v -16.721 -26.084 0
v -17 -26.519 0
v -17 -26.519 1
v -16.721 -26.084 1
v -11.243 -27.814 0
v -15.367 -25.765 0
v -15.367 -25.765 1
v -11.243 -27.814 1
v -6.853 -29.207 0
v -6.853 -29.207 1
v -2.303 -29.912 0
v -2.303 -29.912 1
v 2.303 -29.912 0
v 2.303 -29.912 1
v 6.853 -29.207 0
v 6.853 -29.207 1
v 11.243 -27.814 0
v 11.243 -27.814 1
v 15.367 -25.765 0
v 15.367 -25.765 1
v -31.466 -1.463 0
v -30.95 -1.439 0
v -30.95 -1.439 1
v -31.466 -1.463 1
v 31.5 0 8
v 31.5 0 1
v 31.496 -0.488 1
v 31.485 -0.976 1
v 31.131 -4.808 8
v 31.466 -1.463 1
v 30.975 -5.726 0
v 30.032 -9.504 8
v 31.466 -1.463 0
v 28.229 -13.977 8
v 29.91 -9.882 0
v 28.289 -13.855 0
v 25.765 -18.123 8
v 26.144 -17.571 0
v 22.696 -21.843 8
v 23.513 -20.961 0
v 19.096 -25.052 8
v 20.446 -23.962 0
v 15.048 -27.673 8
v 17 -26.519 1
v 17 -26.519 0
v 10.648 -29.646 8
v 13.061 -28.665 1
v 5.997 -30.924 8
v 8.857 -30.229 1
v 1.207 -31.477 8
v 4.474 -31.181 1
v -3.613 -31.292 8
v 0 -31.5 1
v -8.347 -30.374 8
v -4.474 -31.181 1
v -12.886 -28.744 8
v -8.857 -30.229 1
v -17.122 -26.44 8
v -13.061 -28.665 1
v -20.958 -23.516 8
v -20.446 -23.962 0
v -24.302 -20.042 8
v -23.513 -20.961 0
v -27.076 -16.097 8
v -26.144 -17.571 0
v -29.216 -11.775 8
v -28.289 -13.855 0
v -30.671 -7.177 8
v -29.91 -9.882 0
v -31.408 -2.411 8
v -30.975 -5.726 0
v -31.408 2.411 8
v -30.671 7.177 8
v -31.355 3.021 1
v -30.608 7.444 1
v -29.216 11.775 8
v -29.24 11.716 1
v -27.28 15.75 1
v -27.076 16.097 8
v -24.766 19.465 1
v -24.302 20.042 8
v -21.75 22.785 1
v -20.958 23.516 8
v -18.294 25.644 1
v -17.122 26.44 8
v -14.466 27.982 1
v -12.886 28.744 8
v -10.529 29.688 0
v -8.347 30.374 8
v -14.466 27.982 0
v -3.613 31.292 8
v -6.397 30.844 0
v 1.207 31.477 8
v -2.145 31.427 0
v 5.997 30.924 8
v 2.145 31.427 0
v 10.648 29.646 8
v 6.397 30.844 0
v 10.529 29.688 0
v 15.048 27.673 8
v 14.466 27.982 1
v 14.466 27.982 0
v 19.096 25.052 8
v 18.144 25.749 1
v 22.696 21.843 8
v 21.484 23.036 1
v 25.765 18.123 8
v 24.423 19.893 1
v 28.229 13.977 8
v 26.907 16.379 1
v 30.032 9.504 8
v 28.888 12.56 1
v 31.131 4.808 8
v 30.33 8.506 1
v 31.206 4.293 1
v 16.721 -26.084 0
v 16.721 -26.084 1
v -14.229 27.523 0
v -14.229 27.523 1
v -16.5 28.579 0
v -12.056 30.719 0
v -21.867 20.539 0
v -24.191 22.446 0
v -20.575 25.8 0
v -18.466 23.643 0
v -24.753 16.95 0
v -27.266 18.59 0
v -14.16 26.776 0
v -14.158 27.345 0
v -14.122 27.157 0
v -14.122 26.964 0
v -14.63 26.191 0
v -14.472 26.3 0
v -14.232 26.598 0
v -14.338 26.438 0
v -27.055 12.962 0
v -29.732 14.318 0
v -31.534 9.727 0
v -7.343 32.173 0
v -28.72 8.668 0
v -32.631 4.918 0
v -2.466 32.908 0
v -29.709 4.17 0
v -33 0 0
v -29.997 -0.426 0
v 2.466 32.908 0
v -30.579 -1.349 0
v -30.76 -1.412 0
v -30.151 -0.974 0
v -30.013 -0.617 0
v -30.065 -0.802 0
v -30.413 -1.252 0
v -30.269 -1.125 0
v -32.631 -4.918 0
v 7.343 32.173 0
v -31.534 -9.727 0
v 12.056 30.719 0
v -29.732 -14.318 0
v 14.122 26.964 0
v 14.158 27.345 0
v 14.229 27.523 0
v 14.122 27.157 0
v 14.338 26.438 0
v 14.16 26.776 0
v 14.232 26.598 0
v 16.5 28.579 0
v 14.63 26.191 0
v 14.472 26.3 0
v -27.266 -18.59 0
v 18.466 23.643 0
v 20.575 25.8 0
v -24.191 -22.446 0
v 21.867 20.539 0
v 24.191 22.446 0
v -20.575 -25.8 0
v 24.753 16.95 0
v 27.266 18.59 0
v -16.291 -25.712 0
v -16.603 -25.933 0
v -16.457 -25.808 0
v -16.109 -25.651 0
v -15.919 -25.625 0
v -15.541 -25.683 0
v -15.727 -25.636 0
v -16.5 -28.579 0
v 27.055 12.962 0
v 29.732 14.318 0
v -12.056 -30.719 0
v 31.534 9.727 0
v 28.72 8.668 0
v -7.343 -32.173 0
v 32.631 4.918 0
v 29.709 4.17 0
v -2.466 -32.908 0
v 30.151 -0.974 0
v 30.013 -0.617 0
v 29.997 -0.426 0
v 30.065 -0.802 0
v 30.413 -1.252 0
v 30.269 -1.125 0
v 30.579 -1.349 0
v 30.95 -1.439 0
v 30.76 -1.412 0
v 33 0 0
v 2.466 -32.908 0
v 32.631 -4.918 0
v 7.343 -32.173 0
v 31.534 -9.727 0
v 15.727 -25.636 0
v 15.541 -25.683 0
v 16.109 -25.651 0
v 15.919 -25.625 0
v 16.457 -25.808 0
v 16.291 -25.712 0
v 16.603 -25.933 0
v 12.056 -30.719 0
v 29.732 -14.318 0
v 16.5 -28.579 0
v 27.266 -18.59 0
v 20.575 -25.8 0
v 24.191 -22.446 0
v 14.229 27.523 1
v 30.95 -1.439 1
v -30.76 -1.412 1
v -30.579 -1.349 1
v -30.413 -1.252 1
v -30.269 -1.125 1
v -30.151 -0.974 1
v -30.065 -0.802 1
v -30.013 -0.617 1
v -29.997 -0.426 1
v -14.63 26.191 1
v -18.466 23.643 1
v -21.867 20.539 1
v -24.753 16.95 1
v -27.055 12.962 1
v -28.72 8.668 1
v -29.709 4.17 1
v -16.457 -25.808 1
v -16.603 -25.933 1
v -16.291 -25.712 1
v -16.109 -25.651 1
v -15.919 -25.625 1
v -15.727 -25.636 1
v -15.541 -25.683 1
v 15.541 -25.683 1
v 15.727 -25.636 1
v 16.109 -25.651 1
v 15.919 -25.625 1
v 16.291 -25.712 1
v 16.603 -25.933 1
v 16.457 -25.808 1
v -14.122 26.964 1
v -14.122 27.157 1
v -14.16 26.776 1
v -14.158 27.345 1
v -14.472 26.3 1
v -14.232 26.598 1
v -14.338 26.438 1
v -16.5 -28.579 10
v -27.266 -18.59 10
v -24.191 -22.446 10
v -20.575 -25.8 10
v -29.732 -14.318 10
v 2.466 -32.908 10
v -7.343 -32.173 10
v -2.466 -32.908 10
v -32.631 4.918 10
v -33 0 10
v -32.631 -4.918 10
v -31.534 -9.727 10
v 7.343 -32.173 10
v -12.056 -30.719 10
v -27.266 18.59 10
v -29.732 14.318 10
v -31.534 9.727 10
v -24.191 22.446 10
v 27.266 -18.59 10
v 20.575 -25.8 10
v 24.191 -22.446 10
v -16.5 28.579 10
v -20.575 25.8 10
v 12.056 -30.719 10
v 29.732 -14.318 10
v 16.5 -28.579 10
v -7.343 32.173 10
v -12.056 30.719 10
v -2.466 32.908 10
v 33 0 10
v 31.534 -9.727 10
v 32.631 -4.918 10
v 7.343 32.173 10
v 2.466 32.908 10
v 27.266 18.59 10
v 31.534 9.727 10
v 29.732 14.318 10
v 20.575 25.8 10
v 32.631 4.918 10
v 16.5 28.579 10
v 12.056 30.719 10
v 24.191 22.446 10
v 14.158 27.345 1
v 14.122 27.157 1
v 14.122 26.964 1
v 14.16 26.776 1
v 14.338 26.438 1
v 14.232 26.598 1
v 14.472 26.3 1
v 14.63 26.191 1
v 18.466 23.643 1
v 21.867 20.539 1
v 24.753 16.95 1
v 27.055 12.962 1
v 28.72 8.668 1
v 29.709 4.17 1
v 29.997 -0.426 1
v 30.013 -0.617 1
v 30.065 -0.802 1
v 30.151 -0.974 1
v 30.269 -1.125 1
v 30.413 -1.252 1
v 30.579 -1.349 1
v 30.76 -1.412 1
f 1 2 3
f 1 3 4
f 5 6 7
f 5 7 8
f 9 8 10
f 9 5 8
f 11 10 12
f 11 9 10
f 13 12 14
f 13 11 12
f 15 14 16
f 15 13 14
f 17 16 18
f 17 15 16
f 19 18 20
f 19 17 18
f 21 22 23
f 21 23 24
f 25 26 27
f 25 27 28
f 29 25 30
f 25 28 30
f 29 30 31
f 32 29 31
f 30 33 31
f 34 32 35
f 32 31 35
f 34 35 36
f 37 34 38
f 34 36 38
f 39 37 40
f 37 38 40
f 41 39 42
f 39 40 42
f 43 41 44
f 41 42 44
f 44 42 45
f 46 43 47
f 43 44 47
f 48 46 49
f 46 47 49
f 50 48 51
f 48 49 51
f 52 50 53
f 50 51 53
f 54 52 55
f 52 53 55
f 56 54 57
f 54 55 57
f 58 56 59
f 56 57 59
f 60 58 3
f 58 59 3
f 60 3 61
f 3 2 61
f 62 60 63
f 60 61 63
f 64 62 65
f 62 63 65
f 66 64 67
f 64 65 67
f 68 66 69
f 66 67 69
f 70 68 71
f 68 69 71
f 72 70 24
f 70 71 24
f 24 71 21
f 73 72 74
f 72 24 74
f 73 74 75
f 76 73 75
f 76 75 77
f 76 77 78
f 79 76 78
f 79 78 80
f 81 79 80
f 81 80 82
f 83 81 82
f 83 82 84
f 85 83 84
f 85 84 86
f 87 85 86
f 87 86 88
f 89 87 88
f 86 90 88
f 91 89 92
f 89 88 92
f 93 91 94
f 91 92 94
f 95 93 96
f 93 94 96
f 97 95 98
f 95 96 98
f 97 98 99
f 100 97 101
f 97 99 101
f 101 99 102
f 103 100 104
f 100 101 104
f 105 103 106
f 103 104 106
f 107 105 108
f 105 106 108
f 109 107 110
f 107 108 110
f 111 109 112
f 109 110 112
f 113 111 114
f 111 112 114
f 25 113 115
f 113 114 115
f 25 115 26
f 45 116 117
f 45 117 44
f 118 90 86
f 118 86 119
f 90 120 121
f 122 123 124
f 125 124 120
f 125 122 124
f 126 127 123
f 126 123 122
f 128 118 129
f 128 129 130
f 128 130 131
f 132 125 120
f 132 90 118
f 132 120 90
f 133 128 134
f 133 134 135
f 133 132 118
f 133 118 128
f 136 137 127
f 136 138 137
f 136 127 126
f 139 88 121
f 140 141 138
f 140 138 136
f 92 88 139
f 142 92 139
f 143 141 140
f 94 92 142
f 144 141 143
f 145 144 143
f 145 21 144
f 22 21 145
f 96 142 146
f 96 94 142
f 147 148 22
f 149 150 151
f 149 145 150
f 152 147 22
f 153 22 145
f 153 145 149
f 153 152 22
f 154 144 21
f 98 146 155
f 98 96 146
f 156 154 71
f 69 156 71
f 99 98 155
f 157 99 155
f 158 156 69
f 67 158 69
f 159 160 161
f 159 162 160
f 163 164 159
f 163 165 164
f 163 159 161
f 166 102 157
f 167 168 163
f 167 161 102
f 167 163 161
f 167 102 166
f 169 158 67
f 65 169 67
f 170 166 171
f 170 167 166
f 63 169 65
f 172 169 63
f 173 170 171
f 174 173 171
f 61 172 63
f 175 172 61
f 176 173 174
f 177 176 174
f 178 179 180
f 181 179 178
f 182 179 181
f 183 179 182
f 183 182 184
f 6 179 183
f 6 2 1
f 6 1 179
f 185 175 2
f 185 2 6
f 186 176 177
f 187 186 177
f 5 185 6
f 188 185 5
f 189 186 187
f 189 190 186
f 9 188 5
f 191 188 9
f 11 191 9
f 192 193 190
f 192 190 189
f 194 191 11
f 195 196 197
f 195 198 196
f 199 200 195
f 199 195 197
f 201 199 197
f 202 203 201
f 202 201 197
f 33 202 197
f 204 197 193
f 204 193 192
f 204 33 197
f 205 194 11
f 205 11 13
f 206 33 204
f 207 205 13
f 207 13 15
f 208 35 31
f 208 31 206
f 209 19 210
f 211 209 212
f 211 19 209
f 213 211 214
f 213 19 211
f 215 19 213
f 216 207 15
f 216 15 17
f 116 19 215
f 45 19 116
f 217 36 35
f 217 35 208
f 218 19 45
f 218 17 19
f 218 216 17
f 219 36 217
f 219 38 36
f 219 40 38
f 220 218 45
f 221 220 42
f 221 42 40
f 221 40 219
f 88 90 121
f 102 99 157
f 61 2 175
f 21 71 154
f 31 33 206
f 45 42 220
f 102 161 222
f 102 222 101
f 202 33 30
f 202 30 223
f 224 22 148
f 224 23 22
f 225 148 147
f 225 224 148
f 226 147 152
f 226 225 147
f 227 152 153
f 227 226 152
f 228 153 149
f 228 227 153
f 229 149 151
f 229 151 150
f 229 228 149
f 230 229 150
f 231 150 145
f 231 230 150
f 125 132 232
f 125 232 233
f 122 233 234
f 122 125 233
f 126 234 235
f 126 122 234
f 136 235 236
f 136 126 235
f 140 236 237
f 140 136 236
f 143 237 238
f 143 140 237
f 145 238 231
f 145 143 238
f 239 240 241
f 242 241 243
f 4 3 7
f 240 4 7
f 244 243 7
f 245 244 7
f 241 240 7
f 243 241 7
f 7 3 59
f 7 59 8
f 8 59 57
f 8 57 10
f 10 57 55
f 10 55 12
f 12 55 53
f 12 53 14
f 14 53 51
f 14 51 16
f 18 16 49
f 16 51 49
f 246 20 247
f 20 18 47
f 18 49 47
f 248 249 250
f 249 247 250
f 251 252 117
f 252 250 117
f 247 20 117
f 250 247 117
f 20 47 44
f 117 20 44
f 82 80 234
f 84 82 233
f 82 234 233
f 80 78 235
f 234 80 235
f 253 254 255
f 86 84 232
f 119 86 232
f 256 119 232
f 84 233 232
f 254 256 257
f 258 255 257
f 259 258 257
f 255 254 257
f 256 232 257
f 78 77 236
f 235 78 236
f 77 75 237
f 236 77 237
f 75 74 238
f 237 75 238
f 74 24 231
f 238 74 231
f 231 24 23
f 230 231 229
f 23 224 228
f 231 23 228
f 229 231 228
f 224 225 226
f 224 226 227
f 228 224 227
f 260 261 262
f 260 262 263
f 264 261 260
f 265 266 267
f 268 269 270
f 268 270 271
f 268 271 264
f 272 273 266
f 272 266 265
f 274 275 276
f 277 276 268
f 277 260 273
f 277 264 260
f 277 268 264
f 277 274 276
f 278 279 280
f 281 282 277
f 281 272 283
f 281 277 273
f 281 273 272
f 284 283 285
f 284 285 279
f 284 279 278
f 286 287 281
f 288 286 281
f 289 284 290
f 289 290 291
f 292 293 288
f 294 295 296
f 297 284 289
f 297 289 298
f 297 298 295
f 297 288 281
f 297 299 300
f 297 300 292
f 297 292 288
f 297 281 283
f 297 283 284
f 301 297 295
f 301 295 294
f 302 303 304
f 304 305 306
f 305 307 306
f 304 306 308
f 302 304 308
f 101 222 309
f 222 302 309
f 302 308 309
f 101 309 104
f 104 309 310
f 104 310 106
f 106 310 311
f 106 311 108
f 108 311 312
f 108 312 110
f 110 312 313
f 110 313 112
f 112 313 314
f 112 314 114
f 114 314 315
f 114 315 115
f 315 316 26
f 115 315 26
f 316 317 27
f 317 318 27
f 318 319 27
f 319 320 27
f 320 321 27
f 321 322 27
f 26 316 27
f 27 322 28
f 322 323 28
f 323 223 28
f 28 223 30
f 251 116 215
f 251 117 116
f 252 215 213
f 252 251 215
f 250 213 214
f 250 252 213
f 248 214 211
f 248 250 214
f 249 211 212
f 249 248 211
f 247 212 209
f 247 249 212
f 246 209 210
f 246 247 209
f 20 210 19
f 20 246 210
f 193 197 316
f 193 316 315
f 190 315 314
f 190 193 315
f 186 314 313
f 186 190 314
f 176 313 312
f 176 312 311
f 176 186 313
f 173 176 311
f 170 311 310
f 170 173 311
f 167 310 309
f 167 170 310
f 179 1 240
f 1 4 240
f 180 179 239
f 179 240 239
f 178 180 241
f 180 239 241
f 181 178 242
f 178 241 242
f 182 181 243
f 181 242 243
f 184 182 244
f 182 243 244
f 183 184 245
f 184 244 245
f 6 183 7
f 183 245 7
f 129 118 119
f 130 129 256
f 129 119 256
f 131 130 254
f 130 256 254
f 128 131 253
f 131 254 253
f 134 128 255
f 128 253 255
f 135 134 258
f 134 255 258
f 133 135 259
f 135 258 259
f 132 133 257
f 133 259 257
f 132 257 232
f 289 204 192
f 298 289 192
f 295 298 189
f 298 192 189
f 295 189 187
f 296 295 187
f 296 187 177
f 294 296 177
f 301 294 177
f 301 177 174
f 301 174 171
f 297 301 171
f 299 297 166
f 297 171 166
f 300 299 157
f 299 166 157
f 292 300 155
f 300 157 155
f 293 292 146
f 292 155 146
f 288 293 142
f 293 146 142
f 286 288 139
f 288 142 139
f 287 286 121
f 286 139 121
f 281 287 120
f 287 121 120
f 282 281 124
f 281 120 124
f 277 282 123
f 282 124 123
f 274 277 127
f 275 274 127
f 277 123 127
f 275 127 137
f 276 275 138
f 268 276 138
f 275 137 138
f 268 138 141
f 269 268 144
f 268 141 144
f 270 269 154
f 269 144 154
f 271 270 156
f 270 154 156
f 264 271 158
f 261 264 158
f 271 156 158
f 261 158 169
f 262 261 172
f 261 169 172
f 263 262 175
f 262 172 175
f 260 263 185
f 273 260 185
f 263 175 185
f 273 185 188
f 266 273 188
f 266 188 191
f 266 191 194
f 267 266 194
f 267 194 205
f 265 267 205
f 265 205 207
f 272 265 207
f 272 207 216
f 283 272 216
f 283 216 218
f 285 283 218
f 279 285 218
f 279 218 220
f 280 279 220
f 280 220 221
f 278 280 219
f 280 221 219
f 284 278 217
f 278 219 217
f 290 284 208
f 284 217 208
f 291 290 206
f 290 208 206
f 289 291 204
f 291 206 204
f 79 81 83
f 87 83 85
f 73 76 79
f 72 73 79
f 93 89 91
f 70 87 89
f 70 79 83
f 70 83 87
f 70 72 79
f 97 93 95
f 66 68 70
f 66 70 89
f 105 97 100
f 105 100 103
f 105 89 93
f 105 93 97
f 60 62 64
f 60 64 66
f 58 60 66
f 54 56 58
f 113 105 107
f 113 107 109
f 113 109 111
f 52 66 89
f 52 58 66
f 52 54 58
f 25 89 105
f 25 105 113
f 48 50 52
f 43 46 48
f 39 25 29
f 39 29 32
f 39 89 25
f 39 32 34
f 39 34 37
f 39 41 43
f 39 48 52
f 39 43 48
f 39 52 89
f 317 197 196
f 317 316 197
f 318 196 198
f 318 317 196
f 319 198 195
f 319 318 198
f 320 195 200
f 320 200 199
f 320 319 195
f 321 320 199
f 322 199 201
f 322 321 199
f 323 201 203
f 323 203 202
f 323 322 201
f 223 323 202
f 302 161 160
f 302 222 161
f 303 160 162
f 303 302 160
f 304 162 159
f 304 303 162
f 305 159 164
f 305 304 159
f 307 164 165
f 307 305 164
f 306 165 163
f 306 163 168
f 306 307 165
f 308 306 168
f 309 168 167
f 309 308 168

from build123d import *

# Parameters (mm, degrees)
F0_R     = 33
F1_DEPTH = 10
F2_R     = 31.5
F3_DEPTH = 8
F5_DEPTH = 1
F6_R     = 1


with BuildPart() as f1:
    # F0 (on Top) → F1 (new body)
    with BuildSketch(Plane.XY):
        Circle(F0_R)
    extrude(amount=F1_DEPTH)

    # F2 (on face) → F3 (cut)
    with BuildSketch(Plane(origin=(0, 0, 0), x_dir=(1, 0, 0), z_dir=(0, 0, -1))):
        Circle(F2_R)
    extrude(amount=-F3_DEPTH, mode=Mode.SUBTRACT)

    # F4 (on face) → F5 (join)
    with BuildSketch(Plane(origin=(0, 0, 0), x_dir=(1, 0, 0), z_dir=(0, 0, -1))):
        with BuildLine():
            Line((16.1904761905, 25.2560582975), (17, 26.5188612124))
            ThreePointArc((17, 26.5188612124), (0, 31.5), (-17, 26.5188612124))
            Line((-17, 26.5188612124), (-16.1904761905, 25.2560582975))
            ThreePointArc((-16.1904761905, 25.2560582975), (0, 30), (16.1904761905, 25.2560582975))
        make_face()
        with BuildLine():
            Line((-29.9676261803, 1.3933345316), (-31.4660074893, 1.4630012582))
            ThreePointArc((-31.4660074893, 1.4630012582), (-27.2798002192, -15.75), (-14.4660074893, -27.9818624705))
            Line((-14.4660074893, -27.9818624705), (-13.7771499898, -26.6493928291))
            ThreePointArc((-13.7771499898, -26.6493928291), (-25.9807621135, -15), (-29.9676261803, 1.3933345316))
        make_face()
        with BuildLine():
            Line((13.7771499898, -26.6493928291), (14.4660074893, -27.9818624705))
            ThreePointArc((14.4660074893, -27.9818624705), (27.2798002192, -15.75), (31.4660074893, 1.4630012582))
            Line((31.4660074893, 1.4630012582), (29.9676261803, 1.3933345316))
            ThreePointArc((29.9676261803, 1.3933345316), (25.9807621135, -15), (13.7771499898, -26.6493928291))
        make_face()
    extrude(amount=-F5_DEPTH)

    # F6
    f6_edges = [f1.edges().sort_by_distance(p)[0] for p in [
        (29.967626, -1.393335, 0.5),
        (13.77715, 26.649393, 0.5),
        (16.190476, -25.256058, 0.5),
        (-13.77715, 26.649393, 0.5),
        (-29.967626, -1.393335, 0.5),
        (-16.190476, -25.256058, 0.5),
    ]]
    fillet(f6_edges, radius=F6_R)


solid = f1.part
